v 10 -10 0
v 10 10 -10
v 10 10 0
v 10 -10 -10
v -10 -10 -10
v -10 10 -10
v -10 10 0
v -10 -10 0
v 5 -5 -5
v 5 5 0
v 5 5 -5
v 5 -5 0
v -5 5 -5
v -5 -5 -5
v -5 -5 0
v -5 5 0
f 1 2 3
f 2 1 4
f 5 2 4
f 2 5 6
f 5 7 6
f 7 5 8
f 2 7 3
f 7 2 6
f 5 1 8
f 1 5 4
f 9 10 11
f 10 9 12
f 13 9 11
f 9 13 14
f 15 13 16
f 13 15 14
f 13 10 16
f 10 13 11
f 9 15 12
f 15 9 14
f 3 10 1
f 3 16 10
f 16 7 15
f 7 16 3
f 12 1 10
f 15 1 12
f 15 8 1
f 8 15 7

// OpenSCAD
// The inner cube won't render correctly in OpenCSG mode as long as this bug is present
// Note: This causes a different bug in unstable:
// If we render a preview first, the render() node will be cached as a PolySet. This will
// cause the same problems as in issue495.scad. If we clear cache and render using CGAL,
// it doesn't trigger the bug since we stay in CGAL all the time
difference() {
  render(convexity=2) difference() {
       cube(20, center = true);
       cube(10, center = true);
  }
  translate([0, 0, 15]) cube(30, center=true);
}
